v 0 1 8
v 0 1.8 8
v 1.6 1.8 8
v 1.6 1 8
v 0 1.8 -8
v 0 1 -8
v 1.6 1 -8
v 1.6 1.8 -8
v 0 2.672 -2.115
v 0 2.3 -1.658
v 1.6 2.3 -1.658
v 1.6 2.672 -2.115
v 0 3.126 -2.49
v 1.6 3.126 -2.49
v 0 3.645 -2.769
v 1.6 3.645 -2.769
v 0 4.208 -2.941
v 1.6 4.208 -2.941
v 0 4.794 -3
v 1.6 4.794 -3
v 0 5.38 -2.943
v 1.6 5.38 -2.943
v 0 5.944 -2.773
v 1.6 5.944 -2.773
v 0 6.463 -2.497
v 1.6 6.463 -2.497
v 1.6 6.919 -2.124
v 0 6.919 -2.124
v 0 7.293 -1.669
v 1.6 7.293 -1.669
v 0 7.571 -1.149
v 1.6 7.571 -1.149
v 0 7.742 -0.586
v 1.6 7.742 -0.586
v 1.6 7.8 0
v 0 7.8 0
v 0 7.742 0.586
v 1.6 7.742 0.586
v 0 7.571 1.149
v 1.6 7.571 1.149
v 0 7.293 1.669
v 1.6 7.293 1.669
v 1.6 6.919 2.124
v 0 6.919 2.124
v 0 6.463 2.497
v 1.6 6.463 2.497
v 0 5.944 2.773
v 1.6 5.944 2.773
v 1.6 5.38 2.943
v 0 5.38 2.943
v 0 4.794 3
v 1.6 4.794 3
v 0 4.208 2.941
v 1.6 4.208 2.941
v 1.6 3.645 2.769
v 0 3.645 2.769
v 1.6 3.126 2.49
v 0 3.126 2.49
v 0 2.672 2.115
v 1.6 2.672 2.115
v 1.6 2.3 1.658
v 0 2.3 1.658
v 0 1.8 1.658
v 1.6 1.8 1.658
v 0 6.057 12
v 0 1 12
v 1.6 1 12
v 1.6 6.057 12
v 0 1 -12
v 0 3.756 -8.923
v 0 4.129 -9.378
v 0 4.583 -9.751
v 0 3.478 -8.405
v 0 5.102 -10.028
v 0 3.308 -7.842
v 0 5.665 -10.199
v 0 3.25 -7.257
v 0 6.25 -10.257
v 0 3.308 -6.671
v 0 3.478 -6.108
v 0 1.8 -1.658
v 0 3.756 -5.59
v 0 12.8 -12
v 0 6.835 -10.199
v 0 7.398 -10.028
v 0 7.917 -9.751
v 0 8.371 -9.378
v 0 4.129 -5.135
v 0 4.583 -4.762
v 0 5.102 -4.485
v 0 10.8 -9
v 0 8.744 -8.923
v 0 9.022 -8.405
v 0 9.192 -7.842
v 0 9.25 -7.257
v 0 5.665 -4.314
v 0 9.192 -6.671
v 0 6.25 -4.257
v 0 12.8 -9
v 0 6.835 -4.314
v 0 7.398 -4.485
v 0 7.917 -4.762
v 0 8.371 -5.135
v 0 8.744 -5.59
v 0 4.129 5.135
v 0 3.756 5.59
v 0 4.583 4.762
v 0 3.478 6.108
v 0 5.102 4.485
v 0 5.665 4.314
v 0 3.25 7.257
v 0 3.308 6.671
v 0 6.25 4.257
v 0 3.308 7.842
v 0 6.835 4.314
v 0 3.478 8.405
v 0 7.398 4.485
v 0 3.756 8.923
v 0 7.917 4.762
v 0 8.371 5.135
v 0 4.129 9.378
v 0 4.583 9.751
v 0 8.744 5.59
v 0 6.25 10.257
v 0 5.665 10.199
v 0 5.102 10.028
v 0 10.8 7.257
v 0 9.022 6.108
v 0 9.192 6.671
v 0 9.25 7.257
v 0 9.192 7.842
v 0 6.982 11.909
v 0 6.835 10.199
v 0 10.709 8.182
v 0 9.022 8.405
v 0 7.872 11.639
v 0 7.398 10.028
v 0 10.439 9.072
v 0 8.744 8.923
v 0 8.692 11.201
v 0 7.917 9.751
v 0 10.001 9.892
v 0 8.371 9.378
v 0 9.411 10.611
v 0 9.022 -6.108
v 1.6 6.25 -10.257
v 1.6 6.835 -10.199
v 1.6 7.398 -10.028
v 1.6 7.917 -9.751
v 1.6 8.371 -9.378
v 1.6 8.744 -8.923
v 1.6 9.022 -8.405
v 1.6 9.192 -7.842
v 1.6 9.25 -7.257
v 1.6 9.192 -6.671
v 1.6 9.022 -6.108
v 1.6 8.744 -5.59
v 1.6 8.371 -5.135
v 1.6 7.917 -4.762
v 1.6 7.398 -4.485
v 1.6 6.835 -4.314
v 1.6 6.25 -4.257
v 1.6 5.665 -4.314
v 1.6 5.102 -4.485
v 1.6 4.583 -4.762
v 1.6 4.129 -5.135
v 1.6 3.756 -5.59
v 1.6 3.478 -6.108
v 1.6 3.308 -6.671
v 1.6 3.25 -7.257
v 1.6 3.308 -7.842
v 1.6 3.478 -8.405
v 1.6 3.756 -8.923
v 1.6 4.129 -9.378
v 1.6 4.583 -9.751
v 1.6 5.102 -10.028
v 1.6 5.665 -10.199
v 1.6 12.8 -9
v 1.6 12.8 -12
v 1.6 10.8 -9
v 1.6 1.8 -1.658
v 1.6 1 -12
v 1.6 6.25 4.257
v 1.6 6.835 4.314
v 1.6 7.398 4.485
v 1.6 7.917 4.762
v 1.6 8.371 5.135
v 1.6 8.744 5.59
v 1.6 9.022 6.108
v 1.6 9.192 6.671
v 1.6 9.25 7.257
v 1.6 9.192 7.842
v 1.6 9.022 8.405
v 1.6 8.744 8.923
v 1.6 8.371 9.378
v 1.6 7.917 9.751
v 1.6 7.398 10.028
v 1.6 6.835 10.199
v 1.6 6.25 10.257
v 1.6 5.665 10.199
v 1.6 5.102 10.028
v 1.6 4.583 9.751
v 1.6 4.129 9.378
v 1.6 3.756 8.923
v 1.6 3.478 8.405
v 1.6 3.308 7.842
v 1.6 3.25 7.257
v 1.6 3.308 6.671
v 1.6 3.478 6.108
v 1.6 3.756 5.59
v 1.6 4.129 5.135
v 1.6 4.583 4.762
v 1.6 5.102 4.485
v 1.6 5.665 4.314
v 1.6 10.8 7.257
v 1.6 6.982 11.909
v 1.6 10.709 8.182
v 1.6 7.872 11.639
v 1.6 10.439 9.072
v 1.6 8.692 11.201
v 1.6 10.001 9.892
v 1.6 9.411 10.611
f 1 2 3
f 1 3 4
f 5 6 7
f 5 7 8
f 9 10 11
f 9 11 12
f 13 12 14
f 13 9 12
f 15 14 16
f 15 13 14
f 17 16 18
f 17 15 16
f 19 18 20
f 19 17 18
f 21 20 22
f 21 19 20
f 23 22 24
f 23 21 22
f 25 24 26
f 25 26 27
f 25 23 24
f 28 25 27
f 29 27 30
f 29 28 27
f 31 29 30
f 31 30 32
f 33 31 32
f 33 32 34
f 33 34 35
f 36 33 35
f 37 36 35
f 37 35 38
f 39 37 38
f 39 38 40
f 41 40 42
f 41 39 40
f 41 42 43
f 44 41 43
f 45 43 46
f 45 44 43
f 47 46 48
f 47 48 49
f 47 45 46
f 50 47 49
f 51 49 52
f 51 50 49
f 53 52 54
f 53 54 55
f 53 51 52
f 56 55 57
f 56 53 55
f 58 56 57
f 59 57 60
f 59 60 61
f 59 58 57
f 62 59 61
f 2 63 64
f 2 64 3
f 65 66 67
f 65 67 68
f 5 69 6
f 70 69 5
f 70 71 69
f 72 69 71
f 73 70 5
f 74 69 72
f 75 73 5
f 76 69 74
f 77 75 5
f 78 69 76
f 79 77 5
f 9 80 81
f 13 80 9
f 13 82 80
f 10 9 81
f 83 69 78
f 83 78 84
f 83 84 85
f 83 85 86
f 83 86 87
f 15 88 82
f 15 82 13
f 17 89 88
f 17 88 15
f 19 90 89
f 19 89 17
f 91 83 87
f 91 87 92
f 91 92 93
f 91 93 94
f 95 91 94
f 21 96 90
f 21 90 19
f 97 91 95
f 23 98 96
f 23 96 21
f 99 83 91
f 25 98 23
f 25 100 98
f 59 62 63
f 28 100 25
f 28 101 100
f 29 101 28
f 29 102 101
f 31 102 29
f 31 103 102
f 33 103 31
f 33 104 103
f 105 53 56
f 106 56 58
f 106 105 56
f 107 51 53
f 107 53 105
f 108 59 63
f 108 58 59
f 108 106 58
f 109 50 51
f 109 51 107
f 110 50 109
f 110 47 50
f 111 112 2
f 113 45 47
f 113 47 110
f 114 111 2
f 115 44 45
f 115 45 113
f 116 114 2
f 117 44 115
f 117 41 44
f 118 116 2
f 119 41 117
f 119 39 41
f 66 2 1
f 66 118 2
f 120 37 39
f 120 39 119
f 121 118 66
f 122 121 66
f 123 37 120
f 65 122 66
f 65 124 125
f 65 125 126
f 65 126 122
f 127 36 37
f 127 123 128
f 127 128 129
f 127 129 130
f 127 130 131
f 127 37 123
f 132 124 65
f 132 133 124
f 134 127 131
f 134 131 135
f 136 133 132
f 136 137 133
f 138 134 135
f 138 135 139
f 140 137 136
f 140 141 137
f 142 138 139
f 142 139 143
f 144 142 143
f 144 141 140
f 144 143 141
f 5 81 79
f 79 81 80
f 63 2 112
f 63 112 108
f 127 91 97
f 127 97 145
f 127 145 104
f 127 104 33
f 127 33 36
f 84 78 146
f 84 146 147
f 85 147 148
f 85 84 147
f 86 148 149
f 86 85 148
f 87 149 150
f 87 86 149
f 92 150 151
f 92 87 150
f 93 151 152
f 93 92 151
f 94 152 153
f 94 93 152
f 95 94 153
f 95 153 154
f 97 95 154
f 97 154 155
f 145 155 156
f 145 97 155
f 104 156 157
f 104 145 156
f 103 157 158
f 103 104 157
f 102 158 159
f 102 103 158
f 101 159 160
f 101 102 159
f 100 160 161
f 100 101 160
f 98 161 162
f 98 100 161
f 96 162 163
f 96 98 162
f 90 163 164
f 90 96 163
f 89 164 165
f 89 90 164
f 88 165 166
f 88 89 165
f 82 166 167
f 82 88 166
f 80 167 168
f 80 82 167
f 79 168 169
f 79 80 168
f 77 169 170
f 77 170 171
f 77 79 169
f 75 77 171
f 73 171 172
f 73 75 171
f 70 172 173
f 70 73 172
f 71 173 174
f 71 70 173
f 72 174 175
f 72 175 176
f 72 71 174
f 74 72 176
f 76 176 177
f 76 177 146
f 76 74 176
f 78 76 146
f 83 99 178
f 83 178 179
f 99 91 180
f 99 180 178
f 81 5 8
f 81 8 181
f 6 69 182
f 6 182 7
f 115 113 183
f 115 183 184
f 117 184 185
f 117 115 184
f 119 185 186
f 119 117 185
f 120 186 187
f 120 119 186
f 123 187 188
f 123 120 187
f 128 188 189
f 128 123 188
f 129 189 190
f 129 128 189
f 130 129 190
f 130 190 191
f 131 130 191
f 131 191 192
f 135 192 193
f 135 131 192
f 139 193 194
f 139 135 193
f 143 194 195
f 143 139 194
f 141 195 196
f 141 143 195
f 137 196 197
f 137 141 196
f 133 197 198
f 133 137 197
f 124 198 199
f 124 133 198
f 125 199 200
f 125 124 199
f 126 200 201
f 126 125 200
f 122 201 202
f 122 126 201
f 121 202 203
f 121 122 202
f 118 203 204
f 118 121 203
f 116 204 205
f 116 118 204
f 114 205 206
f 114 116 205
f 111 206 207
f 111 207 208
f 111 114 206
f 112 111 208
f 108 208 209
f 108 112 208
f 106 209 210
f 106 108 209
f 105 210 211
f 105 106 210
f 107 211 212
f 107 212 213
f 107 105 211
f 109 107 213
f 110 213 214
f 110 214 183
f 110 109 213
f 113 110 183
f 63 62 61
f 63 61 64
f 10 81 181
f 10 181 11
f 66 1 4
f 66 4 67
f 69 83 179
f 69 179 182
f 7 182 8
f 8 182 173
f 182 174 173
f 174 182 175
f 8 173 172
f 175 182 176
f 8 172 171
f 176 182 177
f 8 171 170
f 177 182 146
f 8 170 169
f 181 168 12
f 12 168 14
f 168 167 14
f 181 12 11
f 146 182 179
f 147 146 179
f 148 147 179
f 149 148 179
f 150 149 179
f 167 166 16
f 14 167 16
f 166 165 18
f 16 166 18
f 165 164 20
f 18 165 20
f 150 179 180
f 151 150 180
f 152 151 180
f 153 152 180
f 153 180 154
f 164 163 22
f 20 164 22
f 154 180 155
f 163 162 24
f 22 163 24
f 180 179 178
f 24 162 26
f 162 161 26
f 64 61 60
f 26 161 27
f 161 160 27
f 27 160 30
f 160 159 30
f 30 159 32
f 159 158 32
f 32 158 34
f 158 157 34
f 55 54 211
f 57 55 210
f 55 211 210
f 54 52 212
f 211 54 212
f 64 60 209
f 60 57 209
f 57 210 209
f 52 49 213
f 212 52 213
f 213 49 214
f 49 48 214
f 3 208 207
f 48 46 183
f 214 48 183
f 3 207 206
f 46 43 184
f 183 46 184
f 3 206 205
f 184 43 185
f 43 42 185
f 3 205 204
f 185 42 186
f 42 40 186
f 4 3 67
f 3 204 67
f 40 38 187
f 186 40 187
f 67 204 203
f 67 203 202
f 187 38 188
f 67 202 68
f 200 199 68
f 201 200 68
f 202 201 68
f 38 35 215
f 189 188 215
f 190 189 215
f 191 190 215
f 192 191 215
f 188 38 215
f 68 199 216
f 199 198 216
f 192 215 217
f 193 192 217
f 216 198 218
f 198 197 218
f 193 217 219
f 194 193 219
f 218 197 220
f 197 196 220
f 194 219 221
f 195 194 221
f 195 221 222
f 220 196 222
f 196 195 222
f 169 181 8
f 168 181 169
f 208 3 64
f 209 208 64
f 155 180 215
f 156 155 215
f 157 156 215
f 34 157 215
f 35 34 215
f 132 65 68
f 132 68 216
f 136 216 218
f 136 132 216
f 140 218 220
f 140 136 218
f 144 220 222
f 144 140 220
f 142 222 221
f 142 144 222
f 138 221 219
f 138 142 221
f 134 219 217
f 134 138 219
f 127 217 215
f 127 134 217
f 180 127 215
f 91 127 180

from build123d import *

# Parameters (mm, degrees)
SKETCH_2_R      = 3
EXTRUDE_1_DEPTH = 1.6


with BuildPart() as part:
    # 스케치2 → 보스-돌출1 (new body)
    with BuildSketch(Plane(origin=(0, 0, 0), x_dir=(0, 0, -1), z_dir=(1, 0, 0))):
        with BuildLine():
            Line((12, 1), (8, 1))
            Line((8, 1), (8, 1.8))
            Line((8, 1.8), (1.658312395, 1.8))
            Line((1.658312395, 1.8), (1.658312395, 2.3))
            ThreePointArc((1.658312395, 2.3), (0, 7.8), (-1.658312395, 2.3))
            Line((-1.658312395, 2.3), (-1.658312395, 1.8))
            Line((-1.658312395, 1.8), (-8, 1.8))
            Line((-8, 1.8), (-8, 1))
            Line((-8, 1), (-12, 1))
            Line((-12, 1), (-12, 6.056548766))
            ThreePointArc((-12, 6.056548766), (-10.6106753, 9.4106753), (-7.256548766, 10.8))
            Line((-7.256548766, 10.8), (9, 10.8))
            Line((9, 10.8), (9, 12.8))
            Line((9, 12.8), (12, 12.8))
            Line((12, 12.8), (12, 1))
        make_face()
        with Locations((-7.256548766, 6.25)):
            Circle(SKETCH_2_R, mode=Mode.SUBTRACT)
        with Locations((7.256548766, 6.25)):
            Circle(SKETCH_2_R, mode=Mode.SUBTRACT)
    extrude(amount=EXTRUDE_1_DEPTH)


solid = part.part
